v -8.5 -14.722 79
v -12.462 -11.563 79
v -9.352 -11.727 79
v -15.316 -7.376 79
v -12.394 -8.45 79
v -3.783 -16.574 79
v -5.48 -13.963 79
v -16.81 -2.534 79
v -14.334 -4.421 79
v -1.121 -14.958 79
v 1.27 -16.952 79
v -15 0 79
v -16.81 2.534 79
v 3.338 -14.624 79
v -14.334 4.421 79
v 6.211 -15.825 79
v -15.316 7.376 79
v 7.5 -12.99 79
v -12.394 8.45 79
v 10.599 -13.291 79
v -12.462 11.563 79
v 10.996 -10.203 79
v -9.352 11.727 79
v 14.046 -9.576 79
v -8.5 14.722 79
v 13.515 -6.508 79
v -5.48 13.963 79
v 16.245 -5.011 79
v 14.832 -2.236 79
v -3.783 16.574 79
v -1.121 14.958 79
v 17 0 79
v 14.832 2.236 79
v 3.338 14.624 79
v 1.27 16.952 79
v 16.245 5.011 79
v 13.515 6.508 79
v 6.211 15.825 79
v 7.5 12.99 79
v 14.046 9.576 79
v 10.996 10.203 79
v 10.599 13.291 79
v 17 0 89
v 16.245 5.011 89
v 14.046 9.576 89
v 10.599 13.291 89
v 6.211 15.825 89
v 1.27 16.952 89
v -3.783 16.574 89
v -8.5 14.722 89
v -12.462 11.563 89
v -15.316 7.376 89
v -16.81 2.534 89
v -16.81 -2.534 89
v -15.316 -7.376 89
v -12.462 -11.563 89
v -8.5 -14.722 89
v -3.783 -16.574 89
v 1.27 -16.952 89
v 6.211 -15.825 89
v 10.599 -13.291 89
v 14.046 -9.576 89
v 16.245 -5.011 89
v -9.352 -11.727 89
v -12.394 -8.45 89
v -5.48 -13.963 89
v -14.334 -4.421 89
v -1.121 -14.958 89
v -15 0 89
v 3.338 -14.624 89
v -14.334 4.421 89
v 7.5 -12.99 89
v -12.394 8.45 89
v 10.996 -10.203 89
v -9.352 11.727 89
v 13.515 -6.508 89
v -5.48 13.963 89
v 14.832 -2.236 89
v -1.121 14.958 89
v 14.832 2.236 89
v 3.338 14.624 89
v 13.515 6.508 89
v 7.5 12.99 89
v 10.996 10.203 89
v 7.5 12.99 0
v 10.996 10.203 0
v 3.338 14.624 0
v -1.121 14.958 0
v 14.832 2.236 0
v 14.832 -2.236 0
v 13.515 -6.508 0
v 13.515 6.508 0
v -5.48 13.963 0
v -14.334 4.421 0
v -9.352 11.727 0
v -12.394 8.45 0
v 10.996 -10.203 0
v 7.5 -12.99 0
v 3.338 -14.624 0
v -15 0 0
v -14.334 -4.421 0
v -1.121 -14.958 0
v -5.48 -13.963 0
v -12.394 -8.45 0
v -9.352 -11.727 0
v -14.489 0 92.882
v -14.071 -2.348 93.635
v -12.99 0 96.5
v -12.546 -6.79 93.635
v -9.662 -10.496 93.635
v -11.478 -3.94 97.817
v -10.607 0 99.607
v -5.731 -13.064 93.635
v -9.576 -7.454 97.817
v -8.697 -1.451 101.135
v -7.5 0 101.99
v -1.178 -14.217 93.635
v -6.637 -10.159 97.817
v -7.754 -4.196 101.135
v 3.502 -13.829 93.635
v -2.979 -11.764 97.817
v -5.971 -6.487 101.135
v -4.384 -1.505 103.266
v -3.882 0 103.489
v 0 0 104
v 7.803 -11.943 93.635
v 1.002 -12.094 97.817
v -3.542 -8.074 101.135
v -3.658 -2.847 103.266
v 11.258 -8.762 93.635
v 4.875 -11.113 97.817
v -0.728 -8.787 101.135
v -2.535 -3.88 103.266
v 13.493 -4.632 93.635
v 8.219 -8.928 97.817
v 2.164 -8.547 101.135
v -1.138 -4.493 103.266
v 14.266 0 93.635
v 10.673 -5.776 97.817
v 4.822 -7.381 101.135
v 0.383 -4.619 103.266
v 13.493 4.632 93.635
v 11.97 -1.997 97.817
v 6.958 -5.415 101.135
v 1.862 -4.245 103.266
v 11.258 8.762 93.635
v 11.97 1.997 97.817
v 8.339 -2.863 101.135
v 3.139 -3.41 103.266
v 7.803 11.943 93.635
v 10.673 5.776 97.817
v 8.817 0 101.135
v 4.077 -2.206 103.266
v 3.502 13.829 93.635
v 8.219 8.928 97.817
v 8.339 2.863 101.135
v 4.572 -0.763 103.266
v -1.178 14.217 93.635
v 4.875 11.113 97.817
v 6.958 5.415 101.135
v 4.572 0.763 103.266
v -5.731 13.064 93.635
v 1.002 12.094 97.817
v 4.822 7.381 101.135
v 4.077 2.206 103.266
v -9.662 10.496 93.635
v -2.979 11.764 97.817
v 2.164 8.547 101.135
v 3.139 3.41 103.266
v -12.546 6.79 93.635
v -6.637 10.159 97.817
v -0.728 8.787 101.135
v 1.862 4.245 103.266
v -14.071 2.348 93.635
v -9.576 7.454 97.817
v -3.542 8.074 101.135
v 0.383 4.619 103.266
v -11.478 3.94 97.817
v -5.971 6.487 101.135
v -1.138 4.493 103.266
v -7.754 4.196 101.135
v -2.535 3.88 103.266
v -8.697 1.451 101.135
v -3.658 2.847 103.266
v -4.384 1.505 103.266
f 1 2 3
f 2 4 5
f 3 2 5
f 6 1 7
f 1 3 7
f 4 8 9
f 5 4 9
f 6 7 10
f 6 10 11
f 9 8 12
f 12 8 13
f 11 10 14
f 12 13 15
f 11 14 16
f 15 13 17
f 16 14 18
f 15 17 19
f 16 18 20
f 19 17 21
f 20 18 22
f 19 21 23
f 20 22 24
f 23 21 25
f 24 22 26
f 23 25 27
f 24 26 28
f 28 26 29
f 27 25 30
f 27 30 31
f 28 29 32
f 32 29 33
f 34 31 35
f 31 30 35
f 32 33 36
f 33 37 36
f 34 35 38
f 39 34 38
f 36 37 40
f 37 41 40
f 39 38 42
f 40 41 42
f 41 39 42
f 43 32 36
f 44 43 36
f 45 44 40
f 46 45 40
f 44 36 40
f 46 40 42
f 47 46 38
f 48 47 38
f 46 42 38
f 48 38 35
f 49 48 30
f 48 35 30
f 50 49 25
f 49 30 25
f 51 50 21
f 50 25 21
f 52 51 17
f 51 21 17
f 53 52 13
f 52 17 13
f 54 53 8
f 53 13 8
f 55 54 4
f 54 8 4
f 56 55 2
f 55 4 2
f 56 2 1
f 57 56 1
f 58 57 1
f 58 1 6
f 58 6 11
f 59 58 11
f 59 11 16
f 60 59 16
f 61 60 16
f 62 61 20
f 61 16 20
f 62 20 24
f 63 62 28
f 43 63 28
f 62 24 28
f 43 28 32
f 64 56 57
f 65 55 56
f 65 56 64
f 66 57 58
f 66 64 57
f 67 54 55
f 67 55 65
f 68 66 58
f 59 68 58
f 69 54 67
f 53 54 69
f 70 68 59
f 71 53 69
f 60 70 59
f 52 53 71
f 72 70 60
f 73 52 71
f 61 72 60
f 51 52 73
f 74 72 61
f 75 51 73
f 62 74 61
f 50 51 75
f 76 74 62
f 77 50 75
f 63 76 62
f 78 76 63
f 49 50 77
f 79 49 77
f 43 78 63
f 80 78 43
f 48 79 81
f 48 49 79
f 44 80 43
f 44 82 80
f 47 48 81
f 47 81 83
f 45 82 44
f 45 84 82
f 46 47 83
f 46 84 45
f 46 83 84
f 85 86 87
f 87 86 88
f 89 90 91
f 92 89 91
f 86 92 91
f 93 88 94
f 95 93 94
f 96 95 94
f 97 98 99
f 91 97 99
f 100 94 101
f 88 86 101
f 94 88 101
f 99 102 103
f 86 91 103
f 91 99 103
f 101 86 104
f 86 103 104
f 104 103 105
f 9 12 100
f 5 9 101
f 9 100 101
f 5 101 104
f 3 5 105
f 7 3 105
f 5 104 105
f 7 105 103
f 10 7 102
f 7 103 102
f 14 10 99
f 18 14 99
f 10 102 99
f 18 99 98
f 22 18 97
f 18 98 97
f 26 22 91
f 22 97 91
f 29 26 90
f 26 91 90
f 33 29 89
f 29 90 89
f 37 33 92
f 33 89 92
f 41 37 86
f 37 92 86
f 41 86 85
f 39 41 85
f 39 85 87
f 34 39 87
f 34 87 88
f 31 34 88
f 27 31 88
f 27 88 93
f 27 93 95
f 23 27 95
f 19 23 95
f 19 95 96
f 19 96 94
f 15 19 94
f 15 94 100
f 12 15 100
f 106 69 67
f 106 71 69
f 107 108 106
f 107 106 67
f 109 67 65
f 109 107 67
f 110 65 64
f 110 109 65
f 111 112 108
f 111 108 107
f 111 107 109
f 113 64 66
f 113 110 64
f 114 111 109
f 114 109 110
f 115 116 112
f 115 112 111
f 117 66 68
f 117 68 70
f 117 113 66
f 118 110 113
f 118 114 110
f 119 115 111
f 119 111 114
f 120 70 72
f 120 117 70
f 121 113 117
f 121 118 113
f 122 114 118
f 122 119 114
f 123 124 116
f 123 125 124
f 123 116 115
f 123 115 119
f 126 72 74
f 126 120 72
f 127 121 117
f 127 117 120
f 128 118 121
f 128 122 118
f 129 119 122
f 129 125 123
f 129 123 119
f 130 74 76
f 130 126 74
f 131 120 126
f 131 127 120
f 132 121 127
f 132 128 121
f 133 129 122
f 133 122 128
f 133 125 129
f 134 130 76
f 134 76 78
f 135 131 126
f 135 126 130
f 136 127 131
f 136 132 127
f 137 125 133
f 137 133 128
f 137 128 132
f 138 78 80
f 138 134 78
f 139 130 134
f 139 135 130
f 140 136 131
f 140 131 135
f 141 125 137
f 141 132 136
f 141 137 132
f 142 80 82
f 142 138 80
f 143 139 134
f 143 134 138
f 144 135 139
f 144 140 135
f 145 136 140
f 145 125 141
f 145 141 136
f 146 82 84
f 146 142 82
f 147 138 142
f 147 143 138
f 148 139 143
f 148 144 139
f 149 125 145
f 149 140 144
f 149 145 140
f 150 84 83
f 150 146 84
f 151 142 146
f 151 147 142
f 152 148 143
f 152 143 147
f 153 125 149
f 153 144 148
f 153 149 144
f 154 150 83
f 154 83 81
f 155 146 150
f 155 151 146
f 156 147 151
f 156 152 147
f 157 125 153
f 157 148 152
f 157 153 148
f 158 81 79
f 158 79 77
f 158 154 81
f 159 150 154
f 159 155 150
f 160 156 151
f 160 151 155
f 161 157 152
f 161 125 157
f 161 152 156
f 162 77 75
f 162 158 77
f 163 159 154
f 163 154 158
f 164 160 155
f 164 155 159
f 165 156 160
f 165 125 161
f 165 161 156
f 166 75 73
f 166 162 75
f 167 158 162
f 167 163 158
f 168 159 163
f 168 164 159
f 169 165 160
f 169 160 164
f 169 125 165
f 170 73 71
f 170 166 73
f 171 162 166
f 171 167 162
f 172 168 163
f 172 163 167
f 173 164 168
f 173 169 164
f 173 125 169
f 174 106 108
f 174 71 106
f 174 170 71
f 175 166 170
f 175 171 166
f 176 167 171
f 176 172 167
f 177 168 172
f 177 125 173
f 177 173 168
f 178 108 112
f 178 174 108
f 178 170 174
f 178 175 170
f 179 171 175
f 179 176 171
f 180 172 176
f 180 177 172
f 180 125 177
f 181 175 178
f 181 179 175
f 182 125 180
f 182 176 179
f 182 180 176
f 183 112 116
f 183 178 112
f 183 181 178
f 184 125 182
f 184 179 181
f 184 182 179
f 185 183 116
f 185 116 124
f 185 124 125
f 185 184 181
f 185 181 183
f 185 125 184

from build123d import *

# Parameters (mm, degrees)
SKETCH1_R           = 15
BOSS_EXTRUDE1_DEPTH = 104
FILLET1_R           = 15
BOSS_EXTRUDE2_START = 79
SKETCH2_R           = 17
SKETCH2_R_2         = 15
BOSS_EXTRUDE2_DEPTH = 10


with BuildPart() as part:
    # Sketch1 → Boss-Extrude1 (new body)
    with BuildSketch(Plane.XY):
        with Locations(Location((0, 0, 0), (0, 0, 180))):
            Circle(SKETCH1_R)
    extrude(amount=BOSS_EXTRUDE1_DEPTH)

    # Fillet1
    fillet1_edges = [part.edges().sort_by_distance(p)[0] for p in [
        (15, 0, 104),
    ]]
    fillet(fillet1_edges, radius=FILLET1_R)

    # Sketch2 → Boss-Extrude2 (add)
    with BuildSketch(Plane.XY.offset(BOSS_EXTRUDE2_START)):
        Circle(SKETCH2_R)
        with Locations(Location((0, 0, 0), (0, 0, 180))):
            Circle(SKETCH2_R_2, mode=Mode.SUBTRACT)
    extrude(amount=BOSS_EXTRUDE2_DEPTH)


solid = part.part
